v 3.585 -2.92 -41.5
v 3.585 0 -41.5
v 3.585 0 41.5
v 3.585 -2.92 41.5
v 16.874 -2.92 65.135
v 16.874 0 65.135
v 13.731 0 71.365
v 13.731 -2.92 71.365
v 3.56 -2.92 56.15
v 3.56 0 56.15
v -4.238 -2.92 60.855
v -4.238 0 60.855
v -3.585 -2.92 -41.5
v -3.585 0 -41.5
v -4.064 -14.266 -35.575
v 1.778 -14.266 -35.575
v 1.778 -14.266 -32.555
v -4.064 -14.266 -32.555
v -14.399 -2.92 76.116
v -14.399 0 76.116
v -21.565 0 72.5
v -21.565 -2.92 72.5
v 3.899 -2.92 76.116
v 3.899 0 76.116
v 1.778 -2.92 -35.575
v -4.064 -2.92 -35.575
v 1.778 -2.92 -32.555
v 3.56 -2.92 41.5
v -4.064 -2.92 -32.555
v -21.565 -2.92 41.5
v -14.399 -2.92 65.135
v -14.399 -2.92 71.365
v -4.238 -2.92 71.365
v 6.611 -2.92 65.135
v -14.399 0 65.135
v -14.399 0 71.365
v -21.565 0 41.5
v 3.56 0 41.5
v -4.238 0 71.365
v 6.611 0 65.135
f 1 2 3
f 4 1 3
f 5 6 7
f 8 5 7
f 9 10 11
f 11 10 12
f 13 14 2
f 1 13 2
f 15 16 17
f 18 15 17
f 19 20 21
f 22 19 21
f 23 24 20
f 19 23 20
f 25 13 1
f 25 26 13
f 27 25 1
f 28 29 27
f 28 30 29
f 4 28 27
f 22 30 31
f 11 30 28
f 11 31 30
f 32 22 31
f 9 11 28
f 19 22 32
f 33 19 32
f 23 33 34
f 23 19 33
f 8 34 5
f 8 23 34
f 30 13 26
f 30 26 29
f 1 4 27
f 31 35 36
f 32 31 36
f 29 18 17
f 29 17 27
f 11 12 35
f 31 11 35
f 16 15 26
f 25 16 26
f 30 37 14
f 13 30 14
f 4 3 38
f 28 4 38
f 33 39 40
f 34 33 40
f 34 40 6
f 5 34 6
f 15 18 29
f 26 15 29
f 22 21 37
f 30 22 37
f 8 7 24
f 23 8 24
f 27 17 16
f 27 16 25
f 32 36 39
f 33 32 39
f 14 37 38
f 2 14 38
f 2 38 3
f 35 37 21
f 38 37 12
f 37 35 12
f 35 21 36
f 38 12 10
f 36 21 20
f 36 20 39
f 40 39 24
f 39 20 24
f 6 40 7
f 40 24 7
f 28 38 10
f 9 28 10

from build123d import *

# Parameters (mm, degrees)
F1_DEPTH      = 2.92
F2_W          = 11.3588606473
F2_H          = 3.0194446445
F3_DEPTH      = 4.064
F3_DEPTH_BACK = 1.778


with BuildPart() as f1:
    # F0 (on Front) → F1 (new body)
    with BuildSketch(Plane.XZ):
        Polygon((-21.565, 41.5), (-3.585, -41.5), (-3.585, 41.5), align=None)
        Polygon((-21.565, 41.5), (-3.585, 41.5), (3.5597670358, 41.5), (3.5597670358, 56.15), (-21.565, 56.15), align=None)
        Polygon((-21.565, 72.5), (-21.565, 56.15), (3.5597670358, 56.15), (-4.2378189974, 60.8550645411), (-14.3992334591, 65.134861098), (-14.3992334591, 71.3648572564), (-4.2378189974, 71.3648572564), (6.6109970212, 65.134861098), (16.8742514001, 65.134861098), (13.7305296957, 71.3648572564), (3.8987922017, 76.1159212991), (-14.3992334591, 76.1159212991), align=None)
        Polygon((-3.585, -41.5), (3.585, -41.5), (3.585, 41.5), (3.5597670358, 41.5), (-3.585, 41.5), align=None)
    extrude(amount=F1_DEPTH)

    # F2 (on Right) → F3 (join, two sides)
    with BuildSketch(Plane.YZ) as f3_sk:
        with Locations((-8.5862084525, -34.0649671853)):
            Rectangle(F2_W, F2_H)
    extrude(amount=-F3_DEPTH)
    extrude(f3_sk.sketch, amount=F3_DEPTH_BACK)


solid = f1.part
